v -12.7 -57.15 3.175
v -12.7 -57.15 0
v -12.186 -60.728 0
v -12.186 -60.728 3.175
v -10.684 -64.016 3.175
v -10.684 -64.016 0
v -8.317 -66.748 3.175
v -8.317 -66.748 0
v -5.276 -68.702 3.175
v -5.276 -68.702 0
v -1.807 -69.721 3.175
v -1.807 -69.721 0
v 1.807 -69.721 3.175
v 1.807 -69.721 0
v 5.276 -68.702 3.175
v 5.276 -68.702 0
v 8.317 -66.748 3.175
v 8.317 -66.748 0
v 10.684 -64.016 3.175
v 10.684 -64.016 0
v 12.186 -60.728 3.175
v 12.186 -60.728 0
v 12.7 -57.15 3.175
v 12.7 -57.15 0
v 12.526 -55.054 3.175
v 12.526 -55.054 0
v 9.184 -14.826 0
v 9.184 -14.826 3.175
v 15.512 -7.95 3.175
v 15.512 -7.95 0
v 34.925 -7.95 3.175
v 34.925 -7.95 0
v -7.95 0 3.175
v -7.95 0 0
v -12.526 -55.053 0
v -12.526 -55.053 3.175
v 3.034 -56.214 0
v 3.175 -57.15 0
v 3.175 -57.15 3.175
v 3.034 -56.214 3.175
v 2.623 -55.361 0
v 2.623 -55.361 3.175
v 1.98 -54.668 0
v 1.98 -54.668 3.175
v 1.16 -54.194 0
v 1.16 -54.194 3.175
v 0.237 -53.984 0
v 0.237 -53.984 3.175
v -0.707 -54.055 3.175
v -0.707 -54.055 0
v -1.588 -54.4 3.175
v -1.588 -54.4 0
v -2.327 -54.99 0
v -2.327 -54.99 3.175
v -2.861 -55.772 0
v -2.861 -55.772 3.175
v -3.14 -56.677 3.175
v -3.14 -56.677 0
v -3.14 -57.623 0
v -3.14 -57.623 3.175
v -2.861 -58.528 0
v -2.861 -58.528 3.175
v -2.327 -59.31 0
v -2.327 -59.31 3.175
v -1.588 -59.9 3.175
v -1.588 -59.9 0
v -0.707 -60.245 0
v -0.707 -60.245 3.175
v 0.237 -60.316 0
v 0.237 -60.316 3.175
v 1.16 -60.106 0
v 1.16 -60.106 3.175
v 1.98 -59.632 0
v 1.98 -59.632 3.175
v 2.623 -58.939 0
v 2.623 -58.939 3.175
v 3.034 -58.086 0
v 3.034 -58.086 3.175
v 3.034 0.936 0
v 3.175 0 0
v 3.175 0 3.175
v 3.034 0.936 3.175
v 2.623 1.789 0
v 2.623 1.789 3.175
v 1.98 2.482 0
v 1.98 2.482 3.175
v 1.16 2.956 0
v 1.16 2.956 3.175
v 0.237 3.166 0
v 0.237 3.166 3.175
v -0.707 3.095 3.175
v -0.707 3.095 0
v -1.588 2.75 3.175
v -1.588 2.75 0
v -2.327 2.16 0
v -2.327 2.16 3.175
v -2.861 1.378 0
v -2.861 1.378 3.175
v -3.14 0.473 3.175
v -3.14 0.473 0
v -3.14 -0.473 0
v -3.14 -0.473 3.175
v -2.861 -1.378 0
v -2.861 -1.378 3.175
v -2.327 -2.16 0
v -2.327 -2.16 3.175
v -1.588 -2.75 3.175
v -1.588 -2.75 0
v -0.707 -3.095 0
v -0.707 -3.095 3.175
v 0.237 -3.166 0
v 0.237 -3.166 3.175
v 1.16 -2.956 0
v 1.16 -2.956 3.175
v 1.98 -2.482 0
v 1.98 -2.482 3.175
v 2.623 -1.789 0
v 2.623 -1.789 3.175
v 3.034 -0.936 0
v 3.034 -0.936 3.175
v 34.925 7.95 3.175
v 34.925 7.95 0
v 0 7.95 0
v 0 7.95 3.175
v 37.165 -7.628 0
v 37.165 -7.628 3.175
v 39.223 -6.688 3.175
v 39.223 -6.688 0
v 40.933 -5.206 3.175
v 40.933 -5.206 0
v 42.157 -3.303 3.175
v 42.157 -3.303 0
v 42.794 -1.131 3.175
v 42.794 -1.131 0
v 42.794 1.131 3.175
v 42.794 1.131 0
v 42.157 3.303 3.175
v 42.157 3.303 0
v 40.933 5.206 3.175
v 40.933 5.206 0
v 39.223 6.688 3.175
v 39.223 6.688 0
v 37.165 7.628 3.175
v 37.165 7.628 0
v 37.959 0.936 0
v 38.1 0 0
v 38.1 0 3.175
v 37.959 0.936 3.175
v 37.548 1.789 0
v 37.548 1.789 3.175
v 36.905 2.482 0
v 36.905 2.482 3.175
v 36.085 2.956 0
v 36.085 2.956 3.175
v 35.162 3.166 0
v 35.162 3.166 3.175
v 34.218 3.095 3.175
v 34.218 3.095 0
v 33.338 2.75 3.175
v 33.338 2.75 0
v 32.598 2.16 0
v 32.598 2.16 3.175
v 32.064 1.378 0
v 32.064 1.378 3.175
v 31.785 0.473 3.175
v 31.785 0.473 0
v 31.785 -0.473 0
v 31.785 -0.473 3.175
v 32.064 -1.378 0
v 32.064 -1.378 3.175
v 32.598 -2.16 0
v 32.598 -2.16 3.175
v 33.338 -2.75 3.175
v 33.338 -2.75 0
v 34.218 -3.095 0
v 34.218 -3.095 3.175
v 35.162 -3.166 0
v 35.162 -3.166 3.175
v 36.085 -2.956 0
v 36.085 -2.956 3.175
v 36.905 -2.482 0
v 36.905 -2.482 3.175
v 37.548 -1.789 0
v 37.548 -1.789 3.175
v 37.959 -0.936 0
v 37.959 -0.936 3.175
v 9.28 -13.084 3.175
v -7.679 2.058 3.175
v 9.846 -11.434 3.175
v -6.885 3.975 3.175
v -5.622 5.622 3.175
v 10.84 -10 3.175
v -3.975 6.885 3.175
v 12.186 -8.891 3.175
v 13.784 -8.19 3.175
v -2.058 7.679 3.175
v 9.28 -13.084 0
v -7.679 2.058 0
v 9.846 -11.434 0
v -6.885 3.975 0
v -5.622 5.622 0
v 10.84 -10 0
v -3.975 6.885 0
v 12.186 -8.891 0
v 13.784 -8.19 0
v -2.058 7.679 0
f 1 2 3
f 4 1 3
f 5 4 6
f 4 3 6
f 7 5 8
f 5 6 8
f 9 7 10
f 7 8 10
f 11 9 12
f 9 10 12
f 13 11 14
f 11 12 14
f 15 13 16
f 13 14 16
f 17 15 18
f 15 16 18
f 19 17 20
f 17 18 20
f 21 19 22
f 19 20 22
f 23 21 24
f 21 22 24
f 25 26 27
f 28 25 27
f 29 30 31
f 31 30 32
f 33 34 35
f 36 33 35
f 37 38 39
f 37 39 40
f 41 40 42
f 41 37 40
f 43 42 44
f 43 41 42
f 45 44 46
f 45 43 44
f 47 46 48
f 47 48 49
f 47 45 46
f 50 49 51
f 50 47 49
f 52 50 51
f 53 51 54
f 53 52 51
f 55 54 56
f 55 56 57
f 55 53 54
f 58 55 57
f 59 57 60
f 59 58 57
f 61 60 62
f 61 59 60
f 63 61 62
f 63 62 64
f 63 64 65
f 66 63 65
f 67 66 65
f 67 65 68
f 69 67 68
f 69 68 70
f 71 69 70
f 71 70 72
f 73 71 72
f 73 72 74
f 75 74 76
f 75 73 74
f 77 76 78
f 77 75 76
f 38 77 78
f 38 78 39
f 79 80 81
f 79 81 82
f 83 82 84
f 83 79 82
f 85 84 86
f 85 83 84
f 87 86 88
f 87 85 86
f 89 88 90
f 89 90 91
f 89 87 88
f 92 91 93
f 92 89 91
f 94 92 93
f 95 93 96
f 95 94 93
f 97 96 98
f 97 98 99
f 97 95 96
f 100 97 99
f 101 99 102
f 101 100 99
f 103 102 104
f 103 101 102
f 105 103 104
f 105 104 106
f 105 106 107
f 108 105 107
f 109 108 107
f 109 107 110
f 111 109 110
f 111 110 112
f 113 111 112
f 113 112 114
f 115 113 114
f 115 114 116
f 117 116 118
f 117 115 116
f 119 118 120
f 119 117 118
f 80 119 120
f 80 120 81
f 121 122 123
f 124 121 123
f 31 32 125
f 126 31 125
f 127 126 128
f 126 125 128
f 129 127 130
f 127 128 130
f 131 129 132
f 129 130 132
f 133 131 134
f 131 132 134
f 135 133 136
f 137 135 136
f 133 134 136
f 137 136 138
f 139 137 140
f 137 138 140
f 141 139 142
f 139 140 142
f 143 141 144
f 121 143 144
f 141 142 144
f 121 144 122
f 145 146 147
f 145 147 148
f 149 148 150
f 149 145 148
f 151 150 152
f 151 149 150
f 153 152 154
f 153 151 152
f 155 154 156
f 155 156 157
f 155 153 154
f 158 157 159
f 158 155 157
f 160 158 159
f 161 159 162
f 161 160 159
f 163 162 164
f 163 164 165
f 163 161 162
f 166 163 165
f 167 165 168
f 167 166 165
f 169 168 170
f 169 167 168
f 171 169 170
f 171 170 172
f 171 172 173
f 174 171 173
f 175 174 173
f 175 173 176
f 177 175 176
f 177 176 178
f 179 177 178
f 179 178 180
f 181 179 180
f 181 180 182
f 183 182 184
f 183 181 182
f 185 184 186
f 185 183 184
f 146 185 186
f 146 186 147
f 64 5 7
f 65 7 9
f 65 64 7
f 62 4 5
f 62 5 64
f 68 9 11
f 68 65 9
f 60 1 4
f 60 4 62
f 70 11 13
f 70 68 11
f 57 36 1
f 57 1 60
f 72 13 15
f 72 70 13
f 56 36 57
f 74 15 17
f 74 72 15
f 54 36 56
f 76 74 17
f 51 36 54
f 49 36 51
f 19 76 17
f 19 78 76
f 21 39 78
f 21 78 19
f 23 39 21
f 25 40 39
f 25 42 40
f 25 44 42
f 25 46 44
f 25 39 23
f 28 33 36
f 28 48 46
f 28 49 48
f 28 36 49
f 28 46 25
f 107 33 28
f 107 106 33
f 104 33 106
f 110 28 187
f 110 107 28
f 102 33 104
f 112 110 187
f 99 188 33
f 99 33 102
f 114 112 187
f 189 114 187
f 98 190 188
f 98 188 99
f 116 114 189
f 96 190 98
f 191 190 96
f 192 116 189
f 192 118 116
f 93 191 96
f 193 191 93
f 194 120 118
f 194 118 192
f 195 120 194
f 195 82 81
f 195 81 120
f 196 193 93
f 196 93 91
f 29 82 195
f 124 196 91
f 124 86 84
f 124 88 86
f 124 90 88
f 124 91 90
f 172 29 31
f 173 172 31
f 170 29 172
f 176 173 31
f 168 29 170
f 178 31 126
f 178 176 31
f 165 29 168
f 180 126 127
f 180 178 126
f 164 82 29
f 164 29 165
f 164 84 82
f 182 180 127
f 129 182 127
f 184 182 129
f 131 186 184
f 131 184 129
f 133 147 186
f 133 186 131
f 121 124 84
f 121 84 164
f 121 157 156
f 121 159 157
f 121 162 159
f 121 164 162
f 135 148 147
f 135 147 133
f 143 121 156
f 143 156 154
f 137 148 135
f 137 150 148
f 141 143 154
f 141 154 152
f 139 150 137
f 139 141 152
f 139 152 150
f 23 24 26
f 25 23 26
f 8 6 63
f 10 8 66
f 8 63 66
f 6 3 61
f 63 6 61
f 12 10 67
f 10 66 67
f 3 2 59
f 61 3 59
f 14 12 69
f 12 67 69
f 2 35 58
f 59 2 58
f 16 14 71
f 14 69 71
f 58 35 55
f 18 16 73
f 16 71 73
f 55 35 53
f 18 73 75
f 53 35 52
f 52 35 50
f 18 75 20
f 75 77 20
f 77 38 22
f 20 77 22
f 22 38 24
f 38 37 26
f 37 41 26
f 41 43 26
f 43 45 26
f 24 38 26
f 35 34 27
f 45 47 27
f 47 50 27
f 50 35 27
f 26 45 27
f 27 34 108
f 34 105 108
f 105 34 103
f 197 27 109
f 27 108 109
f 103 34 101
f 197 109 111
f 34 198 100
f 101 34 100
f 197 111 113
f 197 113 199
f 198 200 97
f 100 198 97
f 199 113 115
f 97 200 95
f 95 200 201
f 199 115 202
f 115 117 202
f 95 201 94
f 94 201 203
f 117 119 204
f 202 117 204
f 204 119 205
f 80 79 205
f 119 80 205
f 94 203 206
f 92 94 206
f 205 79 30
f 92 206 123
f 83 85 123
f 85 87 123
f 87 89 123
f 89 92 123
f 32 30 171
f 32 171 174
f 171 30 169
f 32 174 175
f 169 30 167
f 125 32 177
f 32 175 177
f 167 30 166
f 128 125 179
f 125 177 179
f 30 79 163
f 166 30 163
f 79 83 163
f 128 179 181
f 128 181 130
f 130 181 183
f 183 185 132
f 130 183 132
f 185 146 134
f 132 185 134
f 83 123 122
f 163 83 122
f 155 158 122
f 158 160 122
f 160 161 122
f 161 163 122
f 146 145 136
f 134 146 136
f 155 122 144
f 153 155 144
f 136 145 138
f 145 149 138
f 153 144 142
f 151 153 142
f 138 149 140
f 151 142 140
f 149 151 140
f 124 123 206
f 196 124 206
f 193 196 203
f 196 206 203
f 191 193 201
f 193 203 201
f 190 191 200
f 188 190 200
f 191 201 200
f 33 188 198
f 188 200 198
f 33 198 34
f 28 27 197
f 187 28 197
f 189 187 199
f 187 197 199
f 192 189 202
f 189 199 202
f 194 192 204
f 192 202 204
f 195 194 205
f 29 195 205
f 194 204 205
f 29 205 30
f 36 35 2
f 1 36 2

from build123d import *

# Parameters (mm, degrees)
SKETCH1_R           = 3.175
BOSS_EXTRUDE1_DEPTH = 3.175


with BuildPart() as part:
    # Sketch1 → Boss-Extrude1 (new body)
    with BuildSketch(Plane.XY):
        with BuildLine():
            ThreePointArc((0, 7.9502), (-5.621640332, 5.621640332), (-7.9502, 0))
            Line((-7.9502, 0), (-12.525754193, -55.05345954))
            Line((-12.525754193, -55.05345954), (-12.7, -57.15))
            ThreePointArc((-12.7, -57.15), (0, -69.85), (12.7, -57.15))
            Line((12.7, -57.15), (12.525900071, -55.054331273))
            Line((12.525900071, -55.054331273), (9.183881789, -14.825922015))
            ThreePointArc((9.183881789, -14.825922015), (10.839778656, -9.999957844), (15.512081878, -7.9502))
            Line((15.512081878, -7.9502), (34.925, -7.9502))
            ThreePointArc((34.925, -7.9502), (42.8752, 0), (34.925, 7.9502))
            Line((34.925, 7.9502), (0, 7.9502))
        make_face()
        with Locations((0, -57.15)):
            Circle(SKETCH1_R, mode=Mode.SUBTRACT)
        Circle(SKETCH1_R, mode=Mode.SUBTRACT)
        with Locations((34.925, 0)):
            Circle(SKETCH1_R, mode=Mode.SUBTRACT)
    extrude(amount=BOSS_EXTRUDE1_DEPTH)


solid = part.part
